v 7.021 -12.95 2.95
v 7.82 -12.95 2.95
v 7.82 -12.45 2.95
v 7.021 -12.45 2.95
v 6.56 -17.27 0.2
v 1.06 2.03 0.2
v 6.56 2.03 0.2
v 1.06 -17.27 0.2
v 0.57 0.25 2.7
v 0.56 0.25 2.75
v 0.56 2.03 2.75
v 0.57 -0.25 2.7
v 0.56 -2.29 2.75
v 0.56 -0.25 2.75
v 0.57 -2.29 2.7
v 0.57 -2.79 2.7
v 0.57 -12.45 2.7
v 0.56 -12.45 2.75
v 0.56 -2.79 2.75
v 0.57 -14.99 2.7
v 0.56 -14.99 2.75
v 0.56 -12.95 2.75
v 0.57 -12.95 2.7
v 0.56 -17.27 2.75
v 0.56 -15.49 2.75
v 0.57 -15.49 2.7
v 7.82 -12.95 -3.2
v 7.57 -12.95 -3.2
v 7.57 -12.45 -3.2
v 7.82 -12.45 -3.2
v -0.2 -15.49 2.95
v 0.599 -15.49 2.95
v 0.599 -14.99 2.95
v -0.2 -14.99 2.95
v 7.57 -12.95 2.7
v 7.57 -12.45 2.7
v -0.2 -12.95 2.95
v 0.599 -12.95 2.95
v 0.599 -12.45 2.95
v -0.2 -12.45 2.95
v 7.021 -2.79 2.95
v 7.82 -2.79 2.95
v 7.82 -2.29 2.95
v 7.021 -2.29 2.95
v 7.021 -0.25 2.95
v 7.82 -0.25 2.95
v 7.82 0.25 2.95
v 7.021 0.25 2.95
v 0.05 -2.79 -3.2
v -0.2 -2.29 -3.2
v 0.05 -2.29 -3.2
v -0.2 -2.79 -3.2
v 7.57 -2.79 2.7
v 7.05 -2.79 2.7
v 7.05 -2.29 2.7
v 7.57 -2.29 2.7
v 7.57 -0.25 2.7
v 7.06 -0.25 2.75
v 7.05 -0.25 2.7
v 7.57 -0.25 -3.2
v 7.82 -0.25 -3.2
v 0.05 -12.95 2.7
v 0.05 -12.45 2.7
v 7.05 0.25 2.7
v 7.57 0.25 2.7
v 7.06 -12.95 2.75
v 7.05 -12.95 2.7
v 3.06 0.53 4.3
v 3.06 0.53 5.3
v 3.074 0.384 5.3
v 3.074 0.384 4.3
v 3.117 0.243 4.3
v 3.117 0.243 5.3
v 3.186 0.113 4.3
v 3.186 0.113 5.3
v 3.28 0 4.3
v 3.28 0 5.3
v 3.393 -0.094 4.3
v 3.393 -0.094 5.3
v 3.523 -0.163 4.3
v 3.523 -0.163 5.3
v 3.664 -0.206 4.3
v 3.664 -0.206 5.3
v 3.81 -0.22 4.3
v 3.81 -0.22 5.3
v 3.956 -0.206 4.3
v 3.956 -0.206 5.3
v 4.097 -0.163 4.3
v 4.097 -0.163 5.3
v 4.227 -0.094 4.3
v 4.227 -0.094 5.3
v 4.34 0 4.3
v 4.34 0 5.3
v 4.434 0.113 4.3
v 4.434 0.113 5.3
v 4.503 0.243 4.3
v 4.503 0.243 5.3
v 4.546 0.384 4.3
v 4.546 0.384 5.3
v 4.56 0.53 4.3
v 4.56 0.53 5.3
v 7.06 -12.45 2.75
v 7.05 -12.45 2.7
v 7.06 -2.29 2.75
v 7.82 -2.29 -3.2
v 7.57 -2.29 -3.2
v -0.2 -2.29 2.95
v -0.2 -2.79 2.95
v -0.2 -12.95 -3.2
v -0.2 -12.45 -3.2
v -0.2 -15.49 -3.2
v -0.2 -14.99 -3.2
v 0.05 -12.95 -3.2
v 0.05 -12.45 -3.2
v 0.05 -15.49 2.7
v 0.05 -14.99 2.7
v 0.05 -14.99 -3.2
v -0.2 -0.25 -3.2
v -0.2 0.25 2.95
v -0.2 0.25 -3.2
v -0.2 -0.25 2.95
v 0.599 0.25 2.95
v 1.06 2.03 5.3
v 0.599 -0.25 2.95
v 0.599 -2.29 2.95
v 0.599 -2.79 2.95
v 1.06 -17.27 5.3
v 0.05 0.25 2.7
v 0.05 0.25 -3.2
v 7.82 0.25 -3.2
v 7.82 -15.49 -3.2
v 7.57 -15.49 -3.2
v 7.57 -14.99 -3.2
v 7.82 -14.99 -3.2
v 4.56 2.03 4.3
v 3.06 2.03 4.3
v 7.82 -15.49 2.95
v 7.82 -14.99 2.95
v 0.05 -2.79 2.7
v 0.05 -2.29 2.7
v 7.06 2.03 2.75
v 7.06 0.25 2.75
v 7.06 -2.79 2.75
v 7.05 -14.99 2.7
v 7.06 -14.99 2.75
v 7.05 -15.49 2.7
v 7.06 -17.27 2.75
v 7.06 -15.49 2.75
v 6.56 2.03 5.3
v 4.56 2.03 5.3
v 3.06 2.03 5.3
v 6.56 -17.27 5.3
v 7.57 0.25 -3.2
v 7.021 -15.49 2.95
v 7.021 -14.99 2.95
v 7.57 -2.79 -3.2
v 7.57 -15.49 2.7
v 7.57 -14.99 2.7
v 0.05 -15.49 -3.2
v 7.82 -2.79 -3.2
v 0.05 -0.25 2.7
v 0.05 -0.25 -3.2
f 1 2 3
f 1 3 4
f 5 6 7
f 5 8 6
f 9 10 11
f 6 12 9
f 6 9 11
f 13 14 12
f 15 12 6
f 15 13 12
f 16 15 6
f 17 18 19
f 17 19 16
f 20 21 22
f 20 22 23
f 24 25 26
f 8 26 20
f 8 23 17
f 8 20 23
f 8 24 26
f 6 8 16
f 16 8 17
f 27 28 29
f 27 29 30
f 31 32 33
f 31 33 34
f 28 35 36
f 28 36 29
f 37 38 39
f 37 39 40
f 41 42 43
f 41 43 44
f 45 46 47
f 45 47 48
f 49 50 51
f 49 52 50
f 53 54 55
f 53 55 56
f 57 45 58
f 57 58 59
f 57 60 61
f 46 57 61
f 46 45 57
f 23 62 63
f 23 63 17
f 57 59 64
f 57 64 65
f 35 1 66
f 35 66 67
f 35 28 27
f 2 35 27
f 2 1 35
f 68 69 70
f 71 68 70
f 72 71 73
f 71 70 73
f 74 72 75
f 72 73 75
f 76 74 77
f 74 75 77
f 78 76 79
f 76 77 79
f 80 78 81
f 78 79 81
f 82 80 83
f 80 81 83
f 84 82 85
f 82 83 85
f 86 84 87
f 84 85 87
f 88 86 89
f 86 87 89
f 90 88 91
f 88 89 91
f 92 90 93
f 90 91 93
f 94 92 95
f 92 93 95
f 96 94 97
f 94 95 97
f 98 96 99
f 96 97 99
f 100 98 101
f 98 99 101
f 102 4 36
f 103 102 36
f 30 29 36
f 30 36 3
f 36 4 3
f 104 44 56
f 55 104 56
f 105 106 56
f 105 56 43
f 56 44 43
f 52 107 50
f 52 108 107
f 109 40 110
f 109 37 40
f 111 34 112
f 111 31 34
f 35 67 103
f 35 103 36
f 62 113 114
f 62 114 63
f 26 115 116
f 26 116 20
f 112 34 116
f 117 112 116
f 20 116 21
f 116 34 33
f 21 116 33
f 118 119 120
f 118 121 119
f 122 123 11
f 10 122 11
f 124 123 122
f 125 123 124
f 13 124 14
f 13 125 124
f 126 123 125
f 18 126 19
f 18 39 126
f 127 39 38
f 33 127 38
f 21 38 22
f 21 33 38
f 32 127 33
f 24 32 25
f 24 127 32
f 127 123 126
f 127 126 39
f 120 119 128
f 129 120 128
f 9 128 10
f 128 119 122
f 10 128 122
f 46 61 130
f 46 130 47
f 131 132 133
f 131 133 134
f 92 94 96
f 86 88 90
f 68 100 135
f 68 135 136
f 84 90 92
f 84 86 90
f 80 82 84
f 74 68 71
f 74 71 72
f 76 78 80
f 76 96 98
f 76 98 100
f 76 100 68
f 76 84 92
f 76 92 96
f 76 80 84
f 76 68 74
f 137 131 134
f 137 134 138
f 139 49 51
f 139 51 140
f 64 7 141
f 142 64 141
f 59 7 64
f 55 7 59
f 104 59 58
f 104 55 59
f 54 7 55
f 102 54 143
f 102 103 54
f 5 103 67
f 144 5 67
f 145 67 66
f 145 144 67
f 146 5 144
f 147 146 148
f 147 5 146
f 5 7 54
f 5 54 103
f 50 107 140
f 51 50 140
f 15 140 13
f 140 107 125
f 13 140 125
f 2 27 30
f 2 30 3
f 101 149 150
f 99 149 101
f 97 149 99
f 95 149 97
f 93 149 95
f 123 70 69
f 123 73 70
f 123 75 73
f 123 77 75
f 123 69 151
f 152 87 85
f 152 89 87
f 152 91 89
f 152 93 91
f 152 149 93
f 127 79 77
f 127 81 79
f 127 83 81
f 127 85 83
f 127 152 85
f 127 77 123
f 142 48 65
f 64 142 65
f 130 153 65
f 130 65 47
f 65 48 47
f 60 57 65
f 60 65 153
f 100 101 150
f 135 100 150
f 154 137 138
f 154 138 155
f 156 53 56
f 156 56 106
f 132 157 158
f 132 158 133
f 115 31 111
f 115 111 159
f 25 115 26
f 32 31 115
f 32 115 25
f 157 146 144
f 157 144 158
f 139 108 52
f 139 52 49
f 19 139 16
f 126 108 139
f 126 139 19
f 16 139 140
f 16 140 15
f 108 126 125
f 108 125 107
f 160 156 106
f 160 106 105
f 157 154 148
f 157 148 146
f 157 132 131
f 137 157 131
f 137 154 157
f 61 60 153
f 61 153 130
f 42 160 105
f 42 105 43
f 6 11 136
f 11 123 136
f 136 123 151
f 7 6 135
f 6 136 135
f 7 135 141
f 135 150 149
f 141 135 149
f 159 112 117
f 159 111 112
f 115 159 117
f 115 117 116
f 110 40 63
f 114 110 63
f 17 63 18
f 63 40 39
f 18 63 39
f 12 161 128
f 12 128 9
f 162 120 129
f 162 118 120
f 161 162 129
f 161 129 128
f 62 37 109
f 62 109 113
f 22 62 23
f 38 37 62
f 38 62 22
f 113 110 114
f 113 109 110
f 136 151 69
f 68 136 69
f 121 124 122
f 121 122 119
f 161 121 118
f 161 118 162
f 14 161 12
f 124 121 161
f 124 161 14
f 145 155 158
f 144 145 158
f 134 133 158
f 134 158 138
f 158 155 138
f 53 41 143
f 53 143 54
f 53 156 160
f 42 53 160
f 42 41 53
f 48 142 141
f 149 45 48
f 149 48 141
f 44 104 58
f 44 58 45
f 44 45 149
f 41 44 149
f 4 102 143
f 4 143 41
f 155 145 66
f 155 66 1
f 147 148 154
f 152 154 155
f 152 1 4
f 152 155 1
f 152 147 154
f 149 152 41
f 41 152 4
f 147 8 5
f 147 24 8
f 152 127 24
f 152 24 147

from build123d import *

# Parameters (mm, degrees)
PAD003_DEPTH = 0.25
PAD_DEPTH    = 9.65
POCKET_DEPTH = 1
PAD002_DEPTH = 0.25
PAD001_DEPTH = 0.25
PAD004_DEPTH = 0.25


with BuildPart() as pad003:
    # Sketch004 → Pad003 (new body, symmetric)
    with BuildSketch(Plane.XZ.offset(2.54)):
        Polygon((-0.2, -3.2), (0.05, -3.2), (0.05, 2.7), (7.57, 2.7), (7.57, -3.2), (7.82, -3.2), (7.82, 2.95), (-0.2, 2.95), align=None)
    extrude(amount=PAD003_DEPTH, both=True)


with BuildPart() as pocket:
    # Sketch → Pad (new body, symmetric)
    with BuildSketch(Plane.XZ.offset(7.62)):
        Polygon((1.06, 0.2), (6.56, 0.2), (7.06, 2.75), (6.56, 5.3), (1.06, 5.3), (0.56, 2.75), align=None)
    extrude(amount=PAD_DEPTH, both=True)

    # Sketch003 → Pocket (cut)
    with BuildSketch(Plane(origin=(0, -7.62, 5.3), x_dir=(-1, 0, 0), z_dir=(0, 0, 1))):
        with BuildLine():
            ThreePointArc((-3.06, -8.15), (-3.81, -7.4), (-4.56, -8.15))
            Line((-4.56, -8.15), (-4.56, -9.65))
            Line((-4.56, -9.65), (-3.06, -9.65))
            Line((-3.06, -9.65), (-3.06, -8.15))
        make_face()
    extrude(amount=-POCKET_DEPTH, mode=Mode.SUBTRACT)


with BuildPart() as pad002:
    # Sketch002 → Pad002 (new body, symmetric)
    with BuildSketch(Plane.XZ.offset(15.24)):
        Polygon((-0.2, -3.2), (0.05, -3.2), (0.05, 2.7), (7.57, 2.7), (7.57, -3.2), (7.82, -3.2), (7.82, 2.95), (-0.2, 2.95), align=None)
    extrude(amount=PAD002_DEPTH, both=True)


with BuildPart() as pad001:
    # Sketch001 → Pad001 (new body, symmetric)
    with BuildSketch(Plane.XZ):
        Polygon((-0.2, -3.2), (0.05, -3.2), (0.05, 2.7), (7.57, 2.7), (7.57, -3.2), (7.82, -3.2), (7.82, 2.95), (-0.2, 2.95), align=None)
    extrude(amount=PAD001_DEPTH, both=True)


with BuildPart() as relay_standexmeder_dip_lowprofile:
    # Sketch005 → Pad004 (new body, symmetric)
    with BuildSketch(Plane.XZ.offset(12.7)):
        Polygon((-0.2, -3.2), (0.05, -3.2), (0.05, 2.7), (7.57, 2.7), (7.57, -3.2), (7.82, -3.2), (7.82, 2.95), (-0.2, 2.95), align=None)
    extrude(amount=PAD004_DEPTH, both=True)

    # Pad004_mp_cp: union Pad003, Pocket, Pad002, Pad001
    add(pad003.part)
    add(pocket.part)
    add(pad002.part)
    add(pad001.part)


solid = relay_standexmeder_dip_lowprofile.part
